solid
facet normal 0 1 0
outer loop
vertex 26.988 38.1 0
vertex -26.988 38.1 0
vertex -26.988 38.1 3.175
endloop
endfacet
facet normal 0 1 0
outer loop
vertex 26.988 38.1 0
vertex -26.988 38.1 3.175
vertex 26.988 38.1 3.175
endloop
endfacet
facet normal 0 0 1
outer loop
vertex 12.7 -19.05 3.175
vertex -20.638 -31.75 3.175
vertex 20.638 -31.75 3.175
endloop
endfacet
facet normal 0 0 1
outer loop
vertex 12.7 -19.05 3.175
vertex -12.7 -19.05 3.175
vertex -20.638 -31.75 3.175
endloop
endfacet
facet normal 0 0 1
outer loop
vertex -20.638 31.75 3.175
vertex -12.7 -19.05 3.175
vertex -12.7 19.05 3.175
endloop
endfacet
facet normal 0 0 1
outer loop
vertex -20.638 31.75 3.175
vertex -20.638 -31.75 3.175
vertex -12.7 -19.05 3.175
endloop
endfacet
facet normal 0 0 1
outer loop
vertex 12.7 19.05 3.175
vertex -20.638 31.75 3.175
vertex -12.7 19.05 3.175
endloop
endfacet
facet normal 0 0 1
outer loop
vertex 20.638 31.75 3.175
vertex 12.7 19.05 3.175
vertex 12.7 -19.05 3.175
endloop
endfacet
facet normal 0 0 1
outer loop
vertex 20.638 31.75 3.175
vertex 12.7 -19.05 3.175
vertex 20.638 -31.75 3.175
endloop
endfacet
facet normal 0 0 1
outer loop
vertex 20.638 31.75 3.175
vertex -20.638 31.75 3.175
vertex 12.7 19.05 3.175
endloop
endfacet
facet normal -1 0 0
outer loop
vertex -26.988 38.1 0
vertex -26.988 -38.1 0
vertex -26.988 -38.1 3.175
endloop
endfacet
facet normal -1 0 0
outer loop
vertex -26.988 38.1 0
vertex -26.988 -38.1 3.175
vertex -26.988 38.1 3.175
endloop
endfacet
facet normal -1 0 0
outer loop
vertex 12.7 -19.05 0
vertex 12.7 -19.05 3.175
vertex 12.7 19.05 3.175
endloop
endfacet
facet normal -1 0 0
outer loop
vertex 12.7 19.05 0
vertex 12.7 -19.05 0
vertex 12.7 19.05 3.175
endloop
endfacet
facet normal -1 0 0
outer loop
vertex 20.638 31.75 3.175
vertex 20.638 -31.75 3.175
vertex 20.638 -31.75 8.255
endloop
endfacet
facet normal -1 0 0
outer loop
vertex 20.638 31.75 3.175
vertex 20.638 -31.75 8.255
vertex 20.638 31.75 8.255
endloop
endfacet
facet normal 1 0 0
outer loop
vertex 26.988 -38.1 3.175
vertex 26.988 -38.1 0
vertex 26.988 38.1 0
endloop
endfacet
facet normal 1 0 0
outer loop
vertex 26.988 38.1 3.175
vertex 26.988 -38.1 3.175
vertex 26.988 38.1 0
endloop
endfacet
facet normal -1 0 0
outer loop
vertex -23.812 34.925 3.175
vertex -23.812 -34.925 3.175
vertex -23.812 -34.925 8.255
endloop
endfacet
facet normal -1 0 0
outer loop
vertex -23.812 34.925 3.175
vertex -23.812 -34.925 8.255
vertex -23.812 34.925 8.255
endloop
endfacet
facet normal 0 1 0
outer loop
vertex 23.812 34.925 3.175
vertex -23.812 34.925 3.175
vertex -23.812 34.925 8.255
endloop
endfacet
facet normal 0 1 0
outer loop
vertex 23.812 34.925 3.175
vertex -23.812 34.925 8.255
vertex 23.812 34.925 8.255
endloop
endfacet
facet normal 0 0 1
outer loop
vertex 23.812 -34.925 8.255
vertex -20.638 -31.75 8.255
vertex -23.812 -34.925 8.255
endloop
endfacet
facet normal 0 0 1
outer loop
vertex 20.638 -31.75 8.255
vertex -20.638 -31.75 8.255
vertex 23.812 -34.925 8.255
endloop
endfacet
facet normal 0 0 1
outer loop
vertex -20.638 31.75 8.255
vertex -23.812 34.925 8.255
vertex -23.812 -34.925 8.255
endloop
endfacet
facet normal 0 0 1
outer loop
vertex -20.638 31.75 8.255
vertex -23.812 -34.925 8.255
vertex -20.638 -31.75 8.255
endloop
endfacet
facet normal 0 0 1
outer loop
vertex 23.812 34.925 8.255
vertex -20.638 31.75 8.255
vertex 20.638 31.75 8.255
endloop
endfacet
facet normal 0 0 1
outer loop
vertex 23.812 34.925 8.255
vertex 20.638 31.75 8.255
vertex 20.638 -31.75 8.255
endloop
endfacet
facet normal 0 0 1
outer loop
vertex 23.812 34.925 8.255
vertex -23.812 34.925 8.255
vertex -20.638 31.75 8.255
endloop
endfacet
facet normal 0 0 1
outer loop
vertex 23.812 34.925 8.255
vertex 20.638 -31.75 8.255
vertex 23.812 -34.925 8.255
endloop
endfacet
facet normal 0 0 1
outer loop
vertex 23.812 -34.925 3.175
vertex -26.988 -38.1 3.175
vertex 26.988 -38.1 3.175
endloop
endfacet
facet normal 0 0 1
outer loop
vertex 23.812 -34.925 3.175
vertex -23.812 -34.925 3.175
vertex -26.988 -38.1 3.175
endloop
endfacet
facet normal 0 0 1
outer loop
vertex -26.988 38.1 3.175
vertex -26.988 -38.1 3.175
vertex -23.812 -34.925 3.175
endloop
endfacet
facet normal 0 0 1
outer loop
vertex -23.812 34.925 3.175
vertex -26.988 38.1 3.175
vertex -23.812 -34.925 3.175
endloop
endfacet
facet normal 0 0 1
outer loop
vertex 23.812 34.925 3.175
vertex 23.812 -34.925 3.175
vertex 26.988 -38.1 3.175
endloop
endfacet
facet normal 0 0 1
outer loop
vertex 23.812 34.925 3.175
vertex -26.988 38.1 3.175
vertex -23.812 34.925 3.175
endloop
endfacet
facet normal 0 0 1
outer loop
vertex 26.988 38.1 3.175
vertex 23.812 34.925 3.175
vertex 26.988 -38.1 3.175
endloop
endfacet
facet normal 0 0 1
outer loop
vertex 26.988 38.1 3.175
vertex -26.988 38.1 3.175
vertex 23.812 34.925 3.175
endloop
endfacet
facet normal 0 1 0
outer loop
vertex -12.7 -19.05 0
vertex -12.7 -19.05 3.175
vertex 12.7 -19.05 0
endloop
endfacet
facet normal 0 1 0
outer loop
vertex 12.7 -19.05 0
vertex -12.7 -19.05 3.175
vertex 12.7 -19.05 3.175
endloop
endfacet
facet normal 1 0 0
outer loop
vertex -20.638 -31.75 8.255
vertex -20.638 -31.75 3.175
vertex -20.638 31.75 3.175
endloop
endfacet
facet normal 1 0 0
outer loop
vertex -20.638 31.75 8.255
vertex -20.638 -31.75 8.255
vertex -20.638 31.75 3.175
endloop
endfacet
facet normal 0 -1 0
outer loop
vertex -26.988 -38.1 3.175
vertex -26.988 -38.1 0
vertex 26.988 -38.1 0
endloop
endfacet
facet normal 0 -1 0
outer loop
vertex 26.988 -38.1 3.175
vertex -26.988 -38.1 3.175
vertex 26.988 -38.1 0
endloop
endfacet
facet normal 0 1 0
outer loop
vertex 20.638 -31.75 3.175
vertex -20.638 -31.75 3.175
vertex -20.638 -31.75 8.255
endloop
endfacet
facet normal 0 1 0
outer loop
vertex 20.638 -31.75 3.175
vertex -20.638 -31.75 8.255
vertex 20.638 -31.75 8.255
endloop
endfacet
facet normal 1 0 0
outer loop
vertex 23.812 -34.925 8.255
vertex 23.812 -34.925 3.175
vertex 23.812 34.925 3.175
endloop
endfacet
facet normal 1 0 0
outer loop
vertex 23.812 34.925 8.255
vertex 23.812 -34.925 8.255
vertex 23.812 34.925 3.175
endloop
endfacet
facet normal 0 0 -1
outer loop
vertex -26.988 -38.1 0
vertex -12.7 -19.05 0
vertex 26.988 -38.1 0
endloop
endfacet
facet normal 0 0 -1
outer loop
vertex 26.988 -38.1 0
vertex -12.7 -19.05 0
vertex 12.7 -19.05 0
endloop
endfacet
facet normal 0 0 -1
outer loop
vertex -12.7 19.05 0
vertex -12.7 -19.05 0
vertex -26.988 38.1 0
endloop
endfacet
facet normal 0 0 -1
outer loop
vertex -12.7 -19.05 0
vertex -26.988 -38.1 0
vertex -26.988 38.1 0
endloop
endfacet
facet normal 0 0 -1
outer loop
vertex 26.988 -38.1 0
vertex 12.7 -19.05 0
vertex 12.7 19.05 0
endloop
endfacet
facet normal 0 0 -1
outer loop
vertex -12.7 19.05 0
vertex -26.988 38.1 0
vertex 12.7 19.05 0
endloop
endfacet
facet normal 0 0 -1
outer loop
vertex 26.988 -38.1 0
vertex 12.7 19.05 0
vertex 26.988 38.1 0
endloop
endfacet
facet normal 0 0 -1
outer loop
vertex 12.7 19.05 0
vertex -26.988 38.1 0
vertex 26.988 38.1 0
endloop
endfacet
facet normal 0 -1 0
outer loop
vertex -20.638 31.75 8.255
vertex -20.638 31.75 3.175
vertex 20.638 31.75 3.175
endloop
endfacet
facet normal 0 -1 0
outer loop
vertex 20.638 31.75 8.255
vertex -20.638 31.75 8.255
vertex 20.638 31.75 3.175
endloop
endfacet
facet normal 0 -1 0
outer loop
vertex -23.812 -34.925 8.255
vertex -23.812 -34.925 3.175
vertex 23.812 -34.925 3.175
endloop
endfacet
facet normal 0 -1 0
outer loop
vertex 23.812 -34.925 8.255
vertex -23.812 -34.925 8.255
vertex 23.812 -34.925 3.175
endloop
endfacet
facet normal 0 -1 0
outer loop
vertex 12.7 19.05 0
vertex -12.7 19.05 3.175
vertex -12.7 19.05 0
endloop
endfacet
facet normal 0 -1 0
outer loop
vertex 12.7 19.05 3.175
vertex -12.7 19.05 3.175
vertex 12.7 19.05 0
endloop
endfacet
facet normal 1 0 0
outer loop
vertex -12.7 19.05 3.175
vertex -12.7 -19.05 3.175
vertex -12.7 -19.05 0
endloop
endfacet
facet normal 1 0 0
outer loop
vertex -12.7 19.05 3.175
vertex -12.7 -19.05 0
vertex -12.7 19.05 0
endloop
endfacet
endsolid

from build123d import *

# Parameters (mm, degrees)
F0_W        = 53.975
F0_H        = 76.2
F1_DEPTH    = 3.175
F2_W        = 47.625
F2_H        = 69.85
F3_DEPTH    = 5.08
F4_T        = 3.175
F4_T3_DEPTH = 53.975
F4_T5_DEPTH = 76.2
F5_W        = 25.4
F5_H        = 38.1
F6_DEPTH    = 25.4


# Not quite as in the source:
# - a shell that OpenCascade refuses in one call is made with other operations: the cavity is built on its own and cut out


with BuildPart() as f1:
    # F0 (on Top) → F1 (new body)
    with BuildSketch(Plane.XY):
        Rectangle(F0_W, F0_H)
    extrude(amount=F1_DEPTH)

    # F2 (on face) → F3 (join)
    with BuildSketch(Plane.XY.offset(3.175)):
        Rectangle(F2_W, F2_H)
    extrude(amount=F3_DEPTH)

    # F4: shell of thickness 3.175, made by hand


with BuildPart() as f4_core1:
    # F4_t2: copy of F1
    add(f1.part)

    # the walls: a layer under each face that stays
    f4_faces = [f4_core1.faces().sort_by_distance(p)[0] for p in [
        (0, 38.1, 1.5875),
        (26.9875, 0, 1.5875),
        (-26.9875, 0, 1.5875),
        (0, 0, 0),
        (-25.1883333333, -35.56, 3.175),
        (0, -38.1, 1.5875),
        (0, 34.925, 5.715),
        (-23.8125, 0, 5.715),
        (0, -34.925, 5.715),
        (23.8125, 0, 5.715),
    ]]
    thicken(f4_faces, amount=-F4_T, mode=Mode.SUBTRACT)

    # F4_s4 → F4_t3 (cut)
    with BuildSketch(Plane.YZ.offset(-26.9875)):
        Polygon((34.95675, 3.20675), (34.925, 0), (31.75, 0), (31.75, 3.175), align=None)
        Polygon((-34.95675, 3.20675), (-34.925, 0), (-31.75, 0), (-31.75, 3.175), align=None)
    extrude(amount=F4_T3_DEPTH, mode=Mode.SUBTRACT)

    # F4_s6 → F4_t5 (cut)
    with BuildSketch(Plane.XZ.offset(-38.1)):
        Polygon((-23.84425, 3.20675), (-23.8125, 0), (-20.6375, 0), (-20.6375, 3.175), align=None)
        Polygon((23.84425, 3.20675), (23.8125, 0), (20.6375, 0), (20.6375, 3.175), align=None)
    extrude(amount=F4_T5_DEPTH, mode=Mode.SUBTRACT)


with BuildPart() as f1_1:
    add(f1.part)

    # what is left inside the walls is the cavity
    f4_cavity = [f4_core1.part.solids().sort_by_distance(p)[0] for p in [
        (0, -10.583333, 3.20675),
    ]]
    add(f4_cavity, mode=Mode.SUBTRACT)

    # F5 (on face) → F6 (cut)
    with BuildSketch(Plane.XY.offset(3.175)):
        Rectangle(F5_W, F5_H)
    extrude(amount=-F6_DEPTH, mode=Mode.SUBTRACT)


solid = f1_1.part
